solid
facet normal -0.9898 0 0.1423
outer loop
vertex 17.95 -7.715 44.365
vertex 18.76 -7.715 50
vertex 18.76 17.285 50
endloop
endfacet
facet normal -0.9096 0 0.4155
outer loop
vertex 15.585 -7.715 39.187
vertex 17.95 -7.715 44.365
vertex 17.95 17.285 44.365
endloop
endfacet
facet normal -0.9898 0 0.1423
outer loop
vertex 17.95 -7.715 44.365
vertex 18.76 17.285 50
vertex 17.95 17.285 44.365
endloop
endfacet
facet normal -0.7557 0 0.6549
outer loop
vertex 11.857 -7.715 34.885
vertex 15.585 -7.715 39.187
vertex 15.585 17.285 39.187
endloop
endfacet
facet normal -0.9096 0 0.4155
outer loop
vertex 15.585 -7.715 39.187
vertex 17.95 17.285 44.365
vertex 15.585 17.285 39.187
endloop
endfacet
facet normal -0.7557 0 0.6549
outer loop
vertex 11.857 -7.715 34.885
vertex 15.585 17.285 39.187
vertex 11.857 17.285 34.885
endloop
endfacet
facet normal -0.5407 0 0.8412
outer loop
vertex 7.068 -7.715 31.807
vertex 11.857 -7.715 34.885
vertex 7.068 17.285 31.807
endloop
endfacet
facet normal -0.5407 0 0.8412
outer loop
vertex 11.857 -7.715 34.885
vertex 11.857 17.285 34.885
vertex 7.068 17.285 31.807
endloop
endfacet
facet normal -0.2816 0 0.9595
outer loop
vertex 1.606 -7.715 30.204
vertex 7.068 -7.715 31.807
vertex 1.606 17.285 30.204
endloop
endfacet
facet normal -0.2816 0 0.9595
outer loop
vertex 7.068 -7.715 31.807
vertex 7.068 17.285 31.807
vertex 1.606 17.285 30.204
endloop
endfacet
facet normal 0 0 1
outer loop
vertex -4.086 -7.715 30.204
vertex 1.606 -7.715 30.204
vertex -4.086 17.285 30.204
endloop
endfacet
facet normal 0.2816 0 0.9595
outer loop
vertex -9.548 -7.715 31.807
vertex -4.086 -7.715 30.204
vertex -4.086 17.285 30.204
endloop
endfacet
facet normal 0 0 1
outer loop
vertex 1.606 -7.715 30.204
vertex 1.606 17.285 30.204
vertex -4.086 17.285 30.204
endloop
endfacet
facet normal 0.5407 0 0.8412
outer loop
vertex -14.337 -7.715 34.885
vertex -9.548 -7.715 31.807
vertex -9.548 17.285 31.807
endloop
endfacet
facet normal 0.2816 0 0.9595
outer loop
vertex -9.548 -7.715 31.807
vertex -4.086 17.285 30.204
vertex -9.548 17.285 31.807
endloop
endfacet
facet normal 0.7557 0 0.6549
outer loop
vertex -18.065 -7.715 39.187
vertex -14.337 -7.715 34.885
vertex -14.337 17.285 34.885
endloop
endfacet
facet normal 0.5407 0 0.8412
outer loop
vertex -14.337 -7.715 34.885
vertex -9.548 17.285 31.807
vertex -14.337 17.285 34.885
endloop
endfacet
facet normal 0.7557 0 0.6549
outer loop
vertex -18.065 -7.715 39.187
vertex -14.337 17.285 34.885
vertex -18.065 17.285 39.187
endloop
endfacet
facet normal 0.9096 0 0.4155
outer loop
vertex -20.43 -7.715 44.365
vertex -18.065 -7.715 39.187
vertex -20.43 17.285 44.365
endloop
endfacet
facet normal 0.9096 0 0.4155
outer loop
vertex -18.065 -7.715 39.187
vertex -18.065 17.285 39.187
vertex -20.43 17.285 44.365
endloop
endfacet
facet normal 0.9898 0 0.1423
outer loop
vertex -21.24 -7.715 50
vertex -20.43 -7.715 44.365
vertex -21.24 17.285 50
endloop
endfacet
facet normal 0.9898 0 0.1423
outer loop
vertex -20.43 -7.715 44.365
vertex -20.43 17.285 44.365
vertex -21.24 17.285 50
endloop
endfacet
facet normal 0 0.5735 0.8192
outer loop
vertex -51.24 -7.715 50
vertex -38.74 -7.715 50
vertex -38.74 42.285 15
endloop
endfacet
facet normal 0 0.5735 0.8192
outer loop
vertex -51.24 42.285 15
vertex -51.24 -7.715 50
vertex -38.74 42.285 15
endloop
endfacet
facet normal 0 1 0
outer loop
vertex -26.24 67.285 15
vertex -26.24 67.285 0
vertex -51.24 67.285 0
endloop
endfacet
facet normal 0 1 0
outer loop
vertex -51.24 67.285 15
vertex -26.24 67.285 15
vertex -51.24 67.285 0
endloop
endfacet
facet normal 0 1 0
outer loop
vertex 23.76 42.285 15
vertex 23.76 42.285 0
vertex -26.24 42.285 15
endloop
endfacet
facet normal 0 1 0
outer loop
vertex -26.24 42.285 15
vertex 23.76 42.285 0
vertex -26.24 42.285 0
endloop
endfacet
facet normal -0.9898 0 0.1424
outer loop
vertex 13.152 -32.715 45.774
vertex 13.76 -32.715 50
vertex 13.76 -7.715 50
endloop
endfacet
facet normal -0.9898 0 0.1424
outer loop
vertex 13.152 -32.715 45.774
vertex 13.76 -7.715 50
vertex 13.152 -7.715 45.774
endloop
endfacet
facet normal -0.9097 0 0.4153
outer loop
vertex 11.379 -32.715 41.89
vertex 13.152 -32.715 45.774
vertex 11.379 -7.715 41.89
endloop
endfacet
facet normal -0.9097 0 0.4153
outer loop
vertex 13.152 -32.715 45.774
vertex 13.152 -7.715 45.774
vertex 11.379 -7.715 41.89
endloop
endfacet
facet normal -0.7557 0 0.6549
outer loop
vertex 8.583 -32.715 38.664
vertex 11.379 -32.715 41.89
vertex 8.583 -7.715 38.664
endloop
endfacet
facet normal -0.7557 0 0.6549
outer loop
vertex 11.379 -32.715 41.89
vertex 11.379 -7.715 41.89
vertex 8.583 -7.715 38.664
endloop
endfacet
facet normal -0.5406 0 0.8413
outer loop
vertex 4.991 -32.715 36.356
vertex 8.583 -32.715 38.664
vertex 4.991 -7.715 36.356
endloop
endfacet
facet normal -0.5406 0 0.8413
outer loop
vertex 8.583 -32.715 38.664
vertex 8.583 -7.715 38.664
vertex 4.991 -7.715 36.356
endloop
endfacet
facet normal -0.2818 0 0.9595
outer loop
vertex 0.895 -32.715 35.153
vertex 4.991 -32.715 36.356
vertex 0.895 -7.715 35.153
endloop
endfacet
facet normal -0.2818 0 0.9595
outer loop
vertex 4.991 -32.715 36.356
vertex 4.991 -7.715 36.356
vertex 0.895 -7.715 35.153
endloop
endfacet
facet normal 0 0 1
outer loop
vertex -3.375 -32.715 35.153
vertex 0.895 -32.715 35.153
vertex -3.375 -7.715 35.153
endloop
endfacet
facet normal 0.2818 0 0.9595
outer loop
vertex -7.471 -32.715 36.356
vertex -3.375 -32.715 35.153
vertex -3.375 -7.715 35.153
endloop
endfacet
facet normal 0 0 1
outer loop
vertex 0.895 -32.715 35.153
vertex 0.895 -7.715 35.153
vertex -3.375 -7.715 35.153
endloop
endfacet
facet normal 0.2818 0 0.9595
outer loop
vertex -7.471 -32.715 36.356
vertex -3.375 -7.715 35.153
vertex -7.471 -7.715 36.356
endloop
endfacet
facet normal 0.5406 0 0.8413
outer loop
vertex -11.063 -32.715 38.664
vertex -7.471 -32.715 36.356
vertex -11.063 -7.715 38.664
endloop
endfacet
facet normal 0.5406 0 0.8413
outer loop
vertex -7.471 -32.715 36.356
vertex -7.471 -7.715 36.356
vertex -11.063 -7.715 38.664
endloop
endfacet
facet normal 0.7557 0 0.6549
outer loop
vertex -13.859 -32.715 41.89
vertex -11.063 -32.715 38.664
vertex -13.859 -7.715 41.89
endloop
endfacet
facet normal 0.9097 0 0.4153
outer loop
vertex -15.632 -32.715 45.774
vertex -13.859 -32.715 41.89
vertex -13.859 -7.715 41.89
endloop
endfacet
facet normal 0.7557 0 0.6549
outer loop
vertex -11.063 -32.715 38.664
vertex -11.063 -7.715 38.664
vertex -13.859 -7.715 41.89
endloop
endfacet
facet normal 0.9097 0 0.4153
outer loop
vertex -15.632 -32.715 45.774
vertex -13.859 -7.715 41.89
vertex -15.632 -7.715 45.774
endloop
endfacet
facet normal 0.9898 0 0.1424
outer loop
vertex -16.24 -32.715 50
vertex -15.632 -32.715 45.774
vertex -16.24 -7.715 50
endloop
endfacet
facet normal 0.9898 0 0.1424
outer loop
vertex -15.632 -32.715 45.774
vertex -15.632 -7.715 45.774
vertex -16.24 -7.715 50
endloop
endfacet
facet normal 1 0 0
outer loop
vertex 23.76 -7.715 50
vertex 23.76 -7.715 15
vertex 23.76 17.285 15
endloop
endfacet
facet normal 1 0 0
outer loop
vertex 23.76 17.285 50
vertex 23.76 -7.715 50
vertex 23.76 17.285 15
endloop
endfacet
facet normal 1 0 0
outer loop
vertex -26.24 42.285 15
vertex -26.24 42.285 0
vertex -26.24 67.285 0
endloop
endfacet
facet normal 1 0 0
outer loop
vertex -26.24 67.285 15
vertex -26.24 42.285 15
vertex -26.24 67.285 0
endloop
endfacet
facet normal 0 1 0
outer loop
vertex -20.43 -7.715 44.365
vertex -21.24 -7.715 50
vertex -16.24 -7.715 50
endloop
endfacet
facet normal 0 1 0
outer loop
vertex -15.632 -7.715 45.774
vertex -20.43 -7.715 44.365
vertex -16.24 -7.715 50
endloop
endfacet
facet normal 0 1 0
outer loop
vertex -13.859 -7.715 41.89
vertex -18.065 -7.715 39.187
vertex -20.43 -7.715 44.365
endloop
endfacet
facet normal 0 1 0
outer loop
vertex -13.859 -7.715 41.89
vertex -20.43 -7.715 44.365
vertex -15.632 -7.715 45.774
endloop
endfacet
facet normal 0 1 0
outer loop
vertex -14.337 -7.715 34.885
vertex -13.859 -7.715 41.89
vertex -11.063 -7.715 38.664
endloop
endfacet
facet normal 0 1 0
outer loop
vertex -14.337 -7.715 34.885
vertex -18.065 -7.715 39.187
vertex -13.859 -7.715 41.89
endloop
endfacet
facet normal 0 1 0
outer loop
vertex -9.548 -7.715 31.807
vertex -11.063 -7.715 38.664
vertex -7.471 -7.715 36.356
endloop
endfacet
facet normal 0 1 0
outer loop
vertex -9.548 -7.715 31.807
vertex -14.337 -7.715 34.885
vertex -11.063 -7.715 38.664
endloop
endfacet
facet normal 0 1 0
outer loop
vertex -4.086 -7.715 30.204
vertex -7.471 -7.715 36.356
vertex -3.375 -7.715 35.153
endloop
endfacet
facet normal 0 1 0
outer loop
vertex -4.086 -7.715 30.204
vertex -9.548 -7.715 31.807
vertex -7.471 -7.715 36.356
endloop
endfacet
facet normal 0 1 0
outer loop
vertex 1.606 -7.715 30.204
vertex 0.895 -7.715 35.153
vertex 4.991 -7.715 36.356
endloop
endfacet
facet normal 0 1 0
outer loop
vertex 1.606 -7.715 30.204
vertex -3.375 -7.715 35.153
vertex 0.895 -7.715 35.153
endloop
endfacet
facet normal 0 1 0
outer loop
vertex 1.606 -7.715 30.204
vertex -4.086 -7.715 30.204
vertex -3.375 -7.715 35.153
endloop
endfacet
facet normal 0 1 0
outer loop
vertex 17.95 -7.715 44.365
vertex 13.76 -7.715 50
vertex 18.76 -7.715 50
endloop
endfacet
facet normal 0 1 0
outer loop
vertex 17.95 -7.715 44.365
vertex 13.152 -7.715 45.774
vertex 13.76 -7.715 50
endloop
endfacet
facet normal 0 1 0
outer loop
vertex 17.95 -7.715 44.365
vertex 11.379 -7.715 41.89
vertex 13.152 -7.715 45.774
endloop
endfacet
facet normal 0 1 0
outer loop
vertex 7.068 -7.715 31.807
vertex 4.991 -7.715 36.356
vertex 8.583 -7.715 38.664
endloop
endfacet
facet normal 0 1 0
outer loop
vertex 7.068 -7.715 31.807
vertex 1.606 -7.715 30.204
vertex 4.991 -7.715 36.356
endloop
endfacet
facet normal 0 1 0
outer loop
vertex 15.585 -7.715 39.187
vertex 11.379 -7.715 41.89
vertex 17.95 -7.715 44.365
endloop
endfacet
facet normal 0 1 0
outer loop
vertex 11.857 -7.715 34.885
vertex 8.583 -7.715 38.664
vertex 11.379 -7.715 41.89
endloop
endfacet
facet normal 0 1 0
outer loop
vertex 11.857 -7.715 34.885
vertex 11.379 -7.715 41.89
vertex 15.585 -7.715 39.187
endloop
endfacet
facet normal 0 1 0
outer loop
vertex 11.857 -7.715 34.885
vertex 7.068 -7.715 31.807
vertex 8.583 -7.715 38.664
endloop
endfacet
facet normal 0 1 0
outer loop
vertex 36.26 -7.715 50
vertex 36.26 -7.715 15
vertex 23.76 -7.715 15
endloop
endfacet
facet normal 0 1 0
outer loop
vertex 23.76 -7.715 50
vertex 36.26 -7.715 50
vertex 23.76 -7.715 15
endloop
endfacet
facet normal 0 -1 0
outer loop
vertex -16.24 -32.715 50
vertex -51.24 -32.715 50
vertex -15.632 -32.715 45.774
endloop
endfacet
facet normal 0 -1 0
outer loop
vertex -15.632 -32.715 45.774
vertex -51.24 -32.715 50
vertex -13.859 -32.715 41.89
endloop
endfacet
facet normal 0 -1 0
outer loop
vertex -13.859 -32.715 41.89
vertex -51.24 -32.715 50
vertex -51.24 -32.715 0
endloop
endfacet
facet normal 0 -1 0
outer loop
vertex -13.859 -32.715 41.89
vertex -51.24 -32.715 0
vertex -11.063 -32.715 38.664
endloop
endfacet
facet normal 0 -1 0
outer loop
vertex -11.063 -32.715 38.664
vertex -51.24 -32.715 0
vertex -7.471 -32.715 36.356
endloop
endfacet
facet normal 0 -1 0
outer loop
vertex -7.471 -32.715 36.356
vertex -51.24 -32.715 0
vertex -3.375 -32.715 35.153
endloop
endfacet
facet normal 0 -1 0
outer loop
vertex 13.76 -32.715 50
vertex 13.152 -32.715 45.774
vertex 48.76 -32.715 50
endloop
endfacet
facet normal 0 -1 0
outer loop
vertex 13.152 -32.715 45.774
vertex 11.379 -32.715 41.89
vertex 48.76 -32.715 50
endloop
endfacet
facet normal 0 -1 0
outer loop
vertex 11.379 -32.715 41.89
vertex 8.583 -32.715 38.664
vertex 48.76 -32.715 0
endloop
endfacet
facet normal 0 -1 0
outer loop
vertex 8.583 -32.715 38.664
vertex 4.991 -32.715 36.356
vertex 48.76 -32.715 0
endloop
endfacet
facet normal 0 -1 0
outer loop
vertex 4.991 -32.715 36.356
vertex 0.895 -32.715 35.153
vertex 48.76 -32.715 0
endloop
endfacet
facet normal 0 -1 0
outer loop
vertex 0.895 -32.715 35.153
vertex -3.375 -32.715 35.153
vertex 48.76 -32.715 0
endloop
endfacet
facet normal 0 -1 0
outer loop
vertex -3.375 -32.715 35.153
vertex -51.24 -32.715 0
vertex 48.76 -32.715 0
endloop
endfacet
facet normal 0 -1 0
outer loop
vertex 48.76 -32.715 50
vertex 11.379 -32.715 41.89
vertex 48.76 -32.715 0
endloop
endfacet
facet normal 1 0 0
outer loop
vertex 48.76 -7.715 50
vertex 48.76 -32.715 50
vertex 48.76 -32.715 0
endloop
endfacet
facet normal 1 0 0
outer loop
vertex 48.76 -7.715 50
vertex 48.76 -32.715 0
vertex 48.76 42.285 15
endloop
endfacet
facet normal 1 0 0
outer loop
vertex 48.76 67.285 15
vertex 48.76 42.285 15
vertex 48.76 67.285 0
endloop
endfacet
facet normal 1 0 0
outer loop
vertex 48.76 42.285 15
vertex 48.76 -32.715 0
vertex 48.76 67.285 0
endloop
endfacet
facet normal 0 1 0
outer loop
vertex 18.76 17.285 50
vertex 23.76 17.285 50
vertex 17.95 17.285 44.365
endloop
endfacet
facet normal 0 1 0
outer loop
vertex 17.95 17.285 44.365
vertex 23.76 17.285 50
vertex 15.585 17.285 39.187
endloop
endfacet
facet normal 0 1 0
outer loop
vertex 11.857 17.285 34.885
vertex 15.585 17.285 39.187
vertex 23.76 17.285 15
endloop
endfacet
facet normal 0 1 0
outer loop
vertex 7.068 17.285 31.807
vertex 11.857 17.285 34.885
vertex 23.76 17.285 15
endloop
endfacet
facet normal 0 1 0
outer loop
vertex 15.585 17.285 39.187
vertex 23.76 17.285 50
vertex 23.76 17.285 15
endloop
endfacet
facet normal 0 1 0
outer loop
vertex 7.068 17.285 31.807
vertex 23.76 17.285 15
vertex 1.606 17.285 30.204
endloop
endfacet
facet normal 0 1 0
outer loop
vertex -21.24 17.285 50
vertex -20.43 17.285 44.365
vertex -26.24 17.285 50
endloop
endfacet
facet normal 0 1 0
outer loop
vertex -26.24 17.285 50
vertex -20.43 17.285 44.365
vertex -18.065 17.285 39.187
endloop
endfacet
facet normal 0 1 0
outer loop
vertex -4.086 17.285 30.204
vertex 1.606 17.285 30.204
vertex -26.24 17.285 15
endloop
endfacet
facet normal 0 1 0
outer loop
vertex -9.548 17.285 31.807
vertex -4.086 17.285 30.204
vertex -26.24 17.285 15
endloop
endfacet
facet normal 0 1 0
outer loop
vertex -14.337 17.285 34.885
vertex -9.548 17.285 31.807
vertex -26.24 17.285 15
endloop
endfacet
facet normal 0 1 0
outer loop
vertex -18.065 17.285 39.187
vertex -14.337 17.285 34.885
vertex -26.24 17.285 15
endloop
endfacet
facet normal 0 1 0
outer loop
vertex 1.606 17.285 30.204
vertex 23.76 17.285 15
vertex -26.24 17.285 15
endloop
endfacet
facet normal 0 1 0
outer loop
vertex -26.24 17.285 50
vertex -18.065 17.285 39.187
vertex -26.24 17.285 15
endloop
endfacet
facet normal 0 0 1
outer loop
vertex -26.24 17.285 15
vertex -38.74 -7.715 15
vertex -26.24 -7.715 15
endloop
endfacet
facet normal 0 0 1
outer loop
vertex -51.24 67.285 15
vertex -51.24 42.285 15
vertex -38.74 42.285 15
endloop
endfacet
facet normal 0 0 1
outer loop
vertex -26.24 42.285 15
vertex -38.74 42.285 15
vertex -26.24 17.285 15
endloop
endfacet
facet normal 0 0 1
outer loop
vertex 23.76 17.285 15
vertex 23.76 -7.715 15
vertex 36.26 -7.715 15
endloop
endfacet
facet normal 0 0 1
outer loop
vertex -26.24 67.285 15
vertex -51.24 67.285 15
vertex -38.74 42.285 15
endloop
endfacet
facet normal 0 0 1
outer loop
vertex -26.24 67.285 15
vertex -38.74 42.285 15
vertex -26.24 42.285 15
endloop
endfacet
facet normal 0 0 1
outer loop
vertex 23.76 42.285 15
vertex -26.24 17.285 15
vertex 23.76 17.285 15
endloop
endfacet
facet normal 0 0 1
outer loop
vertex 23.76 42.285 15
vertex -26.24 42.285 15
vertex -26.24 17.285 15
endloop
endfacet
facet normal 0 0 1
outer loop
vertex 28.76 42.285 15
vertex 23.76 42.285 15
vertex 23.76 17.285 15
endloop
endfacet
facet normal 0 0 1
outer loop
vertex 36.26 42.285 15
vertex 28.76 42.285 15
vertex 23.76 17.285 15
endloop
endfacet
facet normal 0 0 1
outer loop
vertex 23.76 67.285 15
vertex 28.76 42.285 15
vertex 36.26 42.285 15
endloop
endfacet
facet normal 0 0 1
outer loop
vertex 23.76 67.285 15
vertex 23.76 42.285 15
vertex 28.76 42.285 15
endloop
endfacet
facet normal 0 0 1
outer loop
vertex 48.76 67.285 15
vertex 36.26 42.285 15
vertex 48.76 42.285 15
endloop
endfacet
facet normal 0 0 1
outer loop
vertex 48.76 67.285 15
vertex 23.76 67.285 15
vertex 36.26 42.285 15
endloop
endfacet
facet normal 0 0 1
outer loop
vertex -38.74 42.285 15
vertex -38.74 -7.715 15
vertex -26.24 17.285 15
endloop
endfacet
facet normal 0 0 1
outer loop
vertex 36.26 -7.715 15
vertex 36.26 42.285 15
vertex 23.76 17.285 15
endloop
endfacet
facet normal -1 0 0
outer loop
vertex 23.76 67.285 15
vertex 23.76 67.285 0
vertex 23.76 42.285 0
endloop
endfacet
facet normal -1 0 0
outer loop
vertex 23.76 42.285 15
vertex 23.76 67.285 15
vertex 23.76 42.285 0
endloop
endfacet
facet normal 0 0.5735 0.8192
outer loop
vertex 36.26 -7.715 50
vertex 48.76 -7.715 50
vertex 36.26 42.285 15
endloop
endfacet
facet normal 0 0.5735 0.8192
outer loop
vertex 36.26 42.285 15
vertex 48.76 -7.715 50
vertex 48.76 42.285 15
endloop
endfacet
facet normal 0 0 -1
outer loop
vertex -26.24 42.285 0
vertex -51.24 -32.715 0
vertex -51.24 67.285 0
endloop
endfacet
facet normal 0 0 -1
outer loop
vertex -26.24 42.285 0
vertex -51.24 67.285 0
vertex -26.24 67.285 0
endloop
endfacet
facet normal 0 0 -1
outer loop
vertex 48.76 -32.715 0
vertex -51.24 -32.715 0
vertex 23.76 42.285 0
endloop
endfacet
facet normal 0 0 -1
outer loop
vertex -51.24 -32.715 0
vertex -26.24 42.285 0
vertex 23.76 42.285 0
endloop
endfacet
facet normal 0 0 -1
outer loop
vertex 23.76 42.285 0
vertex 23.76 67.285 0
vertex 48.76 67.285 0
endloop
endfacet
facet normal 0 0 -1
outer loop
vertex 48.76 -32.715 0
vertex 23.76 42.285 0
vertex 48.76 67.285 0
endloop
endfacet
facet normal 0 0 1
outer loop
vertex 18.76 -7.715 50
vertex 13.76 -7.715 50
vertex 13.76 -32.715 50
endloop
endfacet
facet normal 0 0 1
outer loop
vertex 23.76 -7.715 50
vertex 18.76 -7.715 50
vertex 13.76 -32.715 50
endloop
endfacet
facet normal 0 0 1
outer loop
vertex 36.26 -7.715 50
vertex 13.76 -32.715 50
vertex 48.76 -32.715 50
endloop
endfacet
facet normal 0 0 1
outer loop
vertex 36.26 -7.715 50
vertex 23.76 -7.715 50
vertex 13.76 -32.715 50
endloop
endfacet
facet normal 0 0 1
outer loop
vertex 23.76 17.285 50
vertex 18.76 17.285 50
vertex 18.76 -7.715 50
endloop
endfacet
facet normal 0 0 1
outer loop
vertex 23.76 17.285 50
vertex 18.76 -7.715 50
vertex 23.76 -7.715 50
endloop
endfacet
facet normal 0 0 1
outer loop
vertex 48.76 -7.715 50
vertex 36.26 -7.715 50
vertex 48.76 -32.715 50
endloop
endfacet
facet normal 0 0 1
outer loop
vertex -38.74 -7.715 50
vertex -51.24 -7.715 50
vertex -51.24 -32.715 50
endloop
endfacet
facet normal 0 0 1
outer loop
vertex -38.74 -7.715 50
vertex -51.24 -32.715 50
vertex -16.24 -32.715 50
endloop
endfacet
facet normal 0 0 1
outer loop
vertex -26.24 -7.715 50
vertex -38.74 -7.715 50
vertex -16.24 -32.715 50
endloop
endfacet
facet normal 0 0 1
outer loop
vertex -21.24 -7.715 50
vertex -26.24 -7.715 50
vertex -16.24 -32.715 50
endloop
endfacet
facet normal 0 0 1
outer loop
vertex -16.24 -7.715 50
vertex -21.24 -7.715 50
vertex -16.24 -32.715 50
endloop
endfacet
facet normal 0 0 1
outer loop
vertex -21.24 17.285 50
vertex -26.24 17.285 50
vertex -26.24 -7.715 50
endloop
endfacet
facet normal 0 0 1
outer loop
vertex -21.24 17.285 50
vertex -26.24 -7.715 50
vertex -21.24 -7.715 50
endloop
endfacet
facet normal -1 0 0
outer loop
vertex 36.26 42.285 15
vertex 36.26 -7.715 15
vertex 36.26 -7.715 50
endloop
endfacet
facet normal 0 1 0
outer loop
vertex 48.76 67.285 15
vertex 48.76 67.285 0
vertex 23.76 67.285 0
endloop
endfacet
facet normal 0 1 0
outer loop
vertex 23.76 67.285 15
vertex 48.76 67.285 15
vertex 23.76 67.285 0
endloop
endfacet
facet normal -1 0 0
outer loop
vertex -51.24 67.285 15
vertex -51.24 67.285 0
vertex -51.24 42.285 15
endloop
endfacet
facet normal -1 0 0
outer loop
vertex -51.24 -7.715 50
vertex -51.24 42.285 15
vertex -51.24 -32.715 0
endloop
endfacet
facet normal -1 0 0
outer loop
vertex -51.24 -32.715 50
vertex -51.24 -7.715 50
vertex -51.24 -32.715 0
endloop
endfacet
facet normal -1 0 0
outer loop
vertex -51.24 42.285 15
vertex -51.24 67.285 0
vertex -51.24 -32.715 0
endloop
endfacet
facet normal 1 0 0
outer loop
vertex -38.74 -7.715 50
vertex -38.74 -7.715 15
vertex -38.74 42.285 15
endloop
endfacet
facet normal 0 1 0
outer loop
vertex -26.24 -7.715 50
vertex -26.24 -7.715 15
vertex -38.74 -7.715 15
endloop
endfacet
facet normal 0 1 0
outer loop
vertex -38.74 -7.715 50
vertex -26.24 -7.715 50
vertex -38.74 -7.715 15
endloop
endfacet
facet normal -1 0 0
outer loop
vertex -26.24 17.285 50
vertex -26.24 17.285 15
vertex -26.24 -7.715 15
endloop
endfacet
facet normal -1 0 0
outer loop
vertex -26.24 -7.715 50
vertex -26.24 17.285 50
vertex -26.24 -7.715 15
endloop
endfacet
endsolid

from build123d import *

# Parameters (mm, degrees)
BOSS_EXTRUDE1_DEPTH = 50
BOSS_EXTRUDE2_DEPTH = 15
SKETCH3_R           = 15
CUT_EXTRUDE3_DEPTH  = 150
SKETCH3_3_R         = 20
SKETCH3_3_R_2       = 15
CUT_EXTRUDE4_DEPTH  = 25
CUT_EXTRUDE7_DEPTH  = 20
CUT_EXTRUDE8_DEPTH  = 20


with BuildPart() as part:
    # Sketch1 → Boss-Extrude1 (new body)
    with BuildSketch(Plane.XY):
        Polygon((-51.239919355, -32.714717742), (48.760080645, -32.714717742), (48.760080645, 42.285282258), (36.260080645, 42.285282258), (36.260080645, -7.714717742), (23.760080645, -7.714717742), (23.760080645, 17.285282258), (-26.239919355, 17.285282258), (-26.239919355, -7.714717742), (-38.739919355, -7.714717742), (-38.739919355, 42.285282258), (-51.239919355, 42.285282258), align=None)
    extrude(amount=BOSS_EXTRUDE1_DEPTH)

    # Sketch1<3> → Boss-Extrude2 (add)
    with BuildSketch(Plane.XY):
        Polygon((-38.739919355, 42.285282258), (-38.739919355, -7.714717742), (-26.239919355, -7.714717742), (-26.239919355, 17.285282258), (23.760080645, 17.285282258), (23.760080645, -7.714717742), (36.260080645, -7.714717742), (36.260080645, 42.285282258), (48.760080645, 42.285282258), (48.760080645, 67.285282258), (23.760080645, 67.285282258), (23.760080645, 42.285282258), (-26.239919355, 42.285282258), (-26.239919355, 67.285282258), (-51.239919355, 67.285282258), (-51.239919355, 42.285282258), align=None)
    extrude(amount=BOSS_EXTRUDE2_DEPTH)

    # Sketch3 → Cut-Extrude3 (cut)
    with BuildSketch(Plane(origin=(0, 17.285282258, 0), x_dir=(1, 0, 0), z_dir=(0, 1, 0))):
        with Locations((-1.239919355, -50)):
            Circle(SKETCH3_R)
    extrude(amount=-CUT_EXTRUDE3_DEPTH, mode=Mode.SUBTRACT)

    # Sketch3<3> → Cut-Extrude4 (cut)
    with BuildSketch(Plane(origin=(0, 17.285282258, 0), x_dir=(1, 0, 0), z_dir=(0, 1, 0))):
        with Locations((-1.239919355, -50)):
            Circle(SKETCH3_3_R)
        with Locations((-1.239919355, -50)):
            Circle(SKETCH3_3_R_2, mode=Mode.SUBTRACT)
    extrude(amount=-CUT_EXTRUDE4_DEPTH, mode=Mode.SUBTRACT)

    # Sketch6 → Cut-Extrude7 (cut)
    with BuildSketch(Plane(origin=(48.760080645, 0, 0), x_dir=(0, 0, -1), z_dir=(1, 0, 0))):
        Polygon((-50, 42.285282258), (-50, -7.714717742), (-15, 42.285282258), align=None)
    extrude(amount=-CUT_EXTRUDE7_DEPTH, mode=Mode.SUBTRACT)

    # Sketch7 → Cut-Extrude8 (cut)
    with BuildSketch(Plane(origin=(-38.739919355, 0, 0), x_dir=(0, 0, -1), z_dir=(1, 0, 0))):
        Polygon((-50, -7.714717742), (-15, 42.285282258), (-50, 42.285282258), align=None)
    extrude(amount=-CUT_EXTRUDE8_DEPTH, mode=Mode.SUBTRACT)


solid = part.part
